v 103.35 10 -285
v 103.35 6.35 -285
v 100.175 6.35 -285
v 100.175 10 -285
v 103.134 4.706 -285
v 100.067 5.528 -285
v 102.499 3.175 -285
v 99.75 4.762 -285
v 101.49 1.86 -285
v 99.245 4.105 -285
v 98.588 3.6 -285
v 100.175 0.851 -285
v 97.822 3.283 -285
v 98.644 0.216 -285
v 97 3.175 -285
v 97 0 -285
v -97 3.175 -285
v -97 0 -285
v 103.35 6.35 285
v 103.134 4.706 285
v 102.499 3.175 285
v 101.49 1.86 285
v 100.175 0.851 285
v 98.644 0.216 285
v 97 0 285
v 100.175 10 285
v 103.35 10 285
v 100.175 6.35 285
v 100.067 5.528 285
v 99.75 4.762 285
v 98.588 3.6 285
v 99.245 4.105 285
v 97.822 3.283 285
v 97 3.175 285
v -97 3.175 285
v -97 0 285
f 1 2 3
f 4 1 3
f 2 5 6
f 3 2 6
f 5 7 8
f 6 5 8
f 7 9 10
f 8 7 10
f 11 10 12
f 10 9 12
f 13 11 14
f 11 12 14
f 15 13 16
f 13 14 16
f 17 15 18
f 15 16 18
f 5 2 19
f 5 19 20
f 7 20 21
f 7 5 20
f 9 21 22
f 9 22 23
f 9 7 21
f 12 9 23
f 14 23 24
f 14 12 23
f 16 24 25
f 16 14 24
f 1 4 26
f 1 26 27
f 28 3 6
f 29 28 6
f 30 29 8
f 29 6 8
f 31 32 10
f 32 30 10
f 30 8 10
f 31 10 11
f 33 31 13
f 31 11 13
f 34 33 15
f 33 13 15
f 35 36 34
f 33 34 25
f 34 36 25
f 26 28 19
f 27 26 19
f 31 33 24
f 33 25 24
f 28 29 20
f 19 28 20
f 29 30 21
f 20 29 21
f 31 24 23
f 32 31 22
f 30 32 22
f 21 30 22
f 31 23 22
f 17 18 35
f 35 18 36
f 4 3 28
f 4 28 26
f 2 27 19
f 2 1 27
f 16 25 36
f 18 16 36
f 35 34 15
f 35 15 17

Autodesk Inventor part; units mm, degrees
ref_plane "YZ Plane" through (0, 0, 0) normal (1, 0, 0) x (0, 1, 0)
ref_plane "XZ Plane" through (0, 0, 0) normal (0, 1, 0) x (-1, 0, 0)
ref_plane "XY Plane" through (0, 0, 0) normal (0, 0, 1) x (1, 0, 0)
sketch "Sketch1" plane through (0, 0, 0) normal (0, 1, 0) x (-1, 0, 0)
  line L0 (97, 285) -> (-97, 285)
  line L1 (-97, 285) -> (-97, -285)
  line L2 (-97, -285) -> (97, -285)
  line L3 (97, -285) -> (97, 285)
  point P0 (0, 0)
  dimension "d0" = 194
  dimension "d1" = 570
  dimension "d2" = 97
  dimension "d3" = 285
extrude "Plate1" add sketch "Sketch1" along normal blind 3.175
sketch "Sketch3" plane through (100.175, 6.35, -285) normal (1, 0, 0) x (0, 1, 0)
  line L0 (0, 570) -> (0, 0)
  line L1 (0, 0) -> (3.65, 0)
  line L2 (3.65, 0) -> (3.65, 570)
  line L3 (3.65, 570) -> (0, 570)
edge flange "Flange1" height 10 angle 90 thickness 3.175 bend radius 3.175 thickness toward (1, 0, 0) relief tear relief width 3.175 relief depth 1.5875 edges at (97, 3.175, 0) wall of the first edge with corners at (100.175, 6.35, 285) (100.175, 6.35, -285) (100.175, 10, -285) (100.175, 10, 285)
bend "Bend1"
corner "Corner1"
equation "\"d4\" = Thickness"
equation "\"d5\" = BendReliefWidth"
equation "\"d6\" = BendReliefDepth"
equation "\"d7\" = MinimumRemnant"
equation "\"d8\" = TransitionRadius"
equation "\"d11\" = BendRadius"
equation "\"d12\" = CornerReliefSize"
equation "\"d13\" = GapSize"
equation "\"d14\" = JacobiRadiusSize"
equation "\"d2\" = 0.5 * d0"
equation "\"d3\" = 0.5 * d1"
equation "\"BendRadius\" = Thickness"
equation "\"BendReliefWidth\" = Thickness"
equation "\"BendReliefDepth\" = 0.5 * Thickness"
equation "\"CornerReliefSize\" = 4 * Thickness"
equation "\"MinimumRemnant\" = 2 * Thickness"
equation "\"TransitionRadius\" = BendRadius"
equation "\"JacobiRadiusSize\" = BendRadius"
equation "\"GapSize\" = Thickness"
equation "\"Thickness\" = 3.175"
properties part number "CO-1-01-controlsSeperator"
